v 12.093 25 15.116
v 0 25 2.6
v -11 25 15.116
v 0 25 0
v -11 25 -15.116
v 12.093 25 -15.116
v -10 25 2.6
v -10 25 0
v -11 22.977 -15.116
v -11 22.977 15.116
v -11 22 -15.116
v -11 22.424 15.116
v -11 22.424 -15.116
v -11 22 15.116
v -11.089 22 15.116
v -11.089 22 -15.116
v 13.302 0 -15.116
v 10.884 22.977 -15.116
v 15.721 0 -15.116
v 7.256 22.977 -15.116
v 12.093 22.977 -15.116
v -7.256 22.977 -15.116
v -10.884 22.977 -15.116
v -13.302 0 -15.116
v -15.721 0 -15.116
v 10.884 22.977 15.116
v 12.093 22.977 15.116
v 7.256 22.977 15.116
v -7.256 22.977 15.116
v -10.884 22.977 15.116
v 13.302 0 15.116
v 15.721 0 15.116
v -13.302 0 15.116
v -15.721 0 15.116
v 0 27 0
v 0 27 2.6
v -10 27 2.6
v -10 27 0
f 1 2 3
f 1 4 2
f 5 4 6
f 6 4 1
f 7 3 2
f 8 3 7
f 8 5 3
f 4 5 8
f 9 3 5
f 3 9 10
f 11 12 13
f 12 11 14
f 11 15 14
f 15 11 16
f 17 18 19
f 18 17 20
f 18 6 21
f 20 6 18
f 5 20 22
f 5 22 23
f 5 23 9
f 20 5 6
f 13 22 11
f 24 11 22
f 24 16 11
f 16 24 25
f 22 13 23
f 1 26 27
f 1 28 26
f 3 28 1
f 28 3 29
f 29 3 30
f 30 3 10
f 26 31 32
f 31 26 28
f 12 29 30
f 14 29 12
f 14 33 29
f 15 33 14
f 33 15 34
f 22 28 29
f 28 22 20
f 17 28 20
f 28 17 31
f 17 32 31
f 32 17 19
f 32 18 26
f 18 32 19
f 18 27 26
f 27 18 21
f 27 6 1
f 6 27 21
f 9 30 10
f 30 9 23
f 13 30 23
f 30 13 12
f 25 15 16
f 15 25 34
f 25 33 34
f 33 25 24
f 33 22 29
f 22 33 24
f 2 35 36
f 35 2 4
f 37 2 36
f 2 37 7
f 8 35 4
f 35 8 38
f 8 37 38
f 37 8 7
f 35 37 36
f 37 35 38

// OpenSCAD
complete();

module complete(){
    
    union(){
        color("Red") translate([-10,42/2+4,0]) cube([10,2,2.6]);
        cutoff_base();
        }//uni
    
    }//mod
module cutoff_base(){
    difference()
    //union()
    {
        scale_base=260/215;
        scale([scale_base,scale_base,scale_base]) base();
        union(){
            translate ([-30,25,-25])cube([50,80,50]);
            translate ([-61,22,-25])cube([50,80,50]);
            //translate ([-61,25,-25])cube([50,80,50]);
            }//uni

        }//diff
}//module

module base(){
 linear_extrude(height = 25, center = true, convexity = 10, twist = 0)
  polygon( points=[ 
  [-11,0],
  [-13,0],
  [-9,19],
  
  [-40+6+0*12+0,19+0],
  [-40+6+0*12+2,35+0],
  
  [-38+6+0*12+2,35+0],
  [-38+6+0*12+0,21+0],
  [38-30+0*12+0,21],
  [38-30+0*12+0,35-10],
  [40-30+0*12,35-10],
  
  [40-30+0*12,19],
  [9,19],
  [13,0],
  [11,0],
  [6,19],
  
  [-6,19]],
  
  paths=[[0,1,2,3,4,5,6,7,8,9,10,11,12,13,14,15]],
  convexity=10);
  
  }
